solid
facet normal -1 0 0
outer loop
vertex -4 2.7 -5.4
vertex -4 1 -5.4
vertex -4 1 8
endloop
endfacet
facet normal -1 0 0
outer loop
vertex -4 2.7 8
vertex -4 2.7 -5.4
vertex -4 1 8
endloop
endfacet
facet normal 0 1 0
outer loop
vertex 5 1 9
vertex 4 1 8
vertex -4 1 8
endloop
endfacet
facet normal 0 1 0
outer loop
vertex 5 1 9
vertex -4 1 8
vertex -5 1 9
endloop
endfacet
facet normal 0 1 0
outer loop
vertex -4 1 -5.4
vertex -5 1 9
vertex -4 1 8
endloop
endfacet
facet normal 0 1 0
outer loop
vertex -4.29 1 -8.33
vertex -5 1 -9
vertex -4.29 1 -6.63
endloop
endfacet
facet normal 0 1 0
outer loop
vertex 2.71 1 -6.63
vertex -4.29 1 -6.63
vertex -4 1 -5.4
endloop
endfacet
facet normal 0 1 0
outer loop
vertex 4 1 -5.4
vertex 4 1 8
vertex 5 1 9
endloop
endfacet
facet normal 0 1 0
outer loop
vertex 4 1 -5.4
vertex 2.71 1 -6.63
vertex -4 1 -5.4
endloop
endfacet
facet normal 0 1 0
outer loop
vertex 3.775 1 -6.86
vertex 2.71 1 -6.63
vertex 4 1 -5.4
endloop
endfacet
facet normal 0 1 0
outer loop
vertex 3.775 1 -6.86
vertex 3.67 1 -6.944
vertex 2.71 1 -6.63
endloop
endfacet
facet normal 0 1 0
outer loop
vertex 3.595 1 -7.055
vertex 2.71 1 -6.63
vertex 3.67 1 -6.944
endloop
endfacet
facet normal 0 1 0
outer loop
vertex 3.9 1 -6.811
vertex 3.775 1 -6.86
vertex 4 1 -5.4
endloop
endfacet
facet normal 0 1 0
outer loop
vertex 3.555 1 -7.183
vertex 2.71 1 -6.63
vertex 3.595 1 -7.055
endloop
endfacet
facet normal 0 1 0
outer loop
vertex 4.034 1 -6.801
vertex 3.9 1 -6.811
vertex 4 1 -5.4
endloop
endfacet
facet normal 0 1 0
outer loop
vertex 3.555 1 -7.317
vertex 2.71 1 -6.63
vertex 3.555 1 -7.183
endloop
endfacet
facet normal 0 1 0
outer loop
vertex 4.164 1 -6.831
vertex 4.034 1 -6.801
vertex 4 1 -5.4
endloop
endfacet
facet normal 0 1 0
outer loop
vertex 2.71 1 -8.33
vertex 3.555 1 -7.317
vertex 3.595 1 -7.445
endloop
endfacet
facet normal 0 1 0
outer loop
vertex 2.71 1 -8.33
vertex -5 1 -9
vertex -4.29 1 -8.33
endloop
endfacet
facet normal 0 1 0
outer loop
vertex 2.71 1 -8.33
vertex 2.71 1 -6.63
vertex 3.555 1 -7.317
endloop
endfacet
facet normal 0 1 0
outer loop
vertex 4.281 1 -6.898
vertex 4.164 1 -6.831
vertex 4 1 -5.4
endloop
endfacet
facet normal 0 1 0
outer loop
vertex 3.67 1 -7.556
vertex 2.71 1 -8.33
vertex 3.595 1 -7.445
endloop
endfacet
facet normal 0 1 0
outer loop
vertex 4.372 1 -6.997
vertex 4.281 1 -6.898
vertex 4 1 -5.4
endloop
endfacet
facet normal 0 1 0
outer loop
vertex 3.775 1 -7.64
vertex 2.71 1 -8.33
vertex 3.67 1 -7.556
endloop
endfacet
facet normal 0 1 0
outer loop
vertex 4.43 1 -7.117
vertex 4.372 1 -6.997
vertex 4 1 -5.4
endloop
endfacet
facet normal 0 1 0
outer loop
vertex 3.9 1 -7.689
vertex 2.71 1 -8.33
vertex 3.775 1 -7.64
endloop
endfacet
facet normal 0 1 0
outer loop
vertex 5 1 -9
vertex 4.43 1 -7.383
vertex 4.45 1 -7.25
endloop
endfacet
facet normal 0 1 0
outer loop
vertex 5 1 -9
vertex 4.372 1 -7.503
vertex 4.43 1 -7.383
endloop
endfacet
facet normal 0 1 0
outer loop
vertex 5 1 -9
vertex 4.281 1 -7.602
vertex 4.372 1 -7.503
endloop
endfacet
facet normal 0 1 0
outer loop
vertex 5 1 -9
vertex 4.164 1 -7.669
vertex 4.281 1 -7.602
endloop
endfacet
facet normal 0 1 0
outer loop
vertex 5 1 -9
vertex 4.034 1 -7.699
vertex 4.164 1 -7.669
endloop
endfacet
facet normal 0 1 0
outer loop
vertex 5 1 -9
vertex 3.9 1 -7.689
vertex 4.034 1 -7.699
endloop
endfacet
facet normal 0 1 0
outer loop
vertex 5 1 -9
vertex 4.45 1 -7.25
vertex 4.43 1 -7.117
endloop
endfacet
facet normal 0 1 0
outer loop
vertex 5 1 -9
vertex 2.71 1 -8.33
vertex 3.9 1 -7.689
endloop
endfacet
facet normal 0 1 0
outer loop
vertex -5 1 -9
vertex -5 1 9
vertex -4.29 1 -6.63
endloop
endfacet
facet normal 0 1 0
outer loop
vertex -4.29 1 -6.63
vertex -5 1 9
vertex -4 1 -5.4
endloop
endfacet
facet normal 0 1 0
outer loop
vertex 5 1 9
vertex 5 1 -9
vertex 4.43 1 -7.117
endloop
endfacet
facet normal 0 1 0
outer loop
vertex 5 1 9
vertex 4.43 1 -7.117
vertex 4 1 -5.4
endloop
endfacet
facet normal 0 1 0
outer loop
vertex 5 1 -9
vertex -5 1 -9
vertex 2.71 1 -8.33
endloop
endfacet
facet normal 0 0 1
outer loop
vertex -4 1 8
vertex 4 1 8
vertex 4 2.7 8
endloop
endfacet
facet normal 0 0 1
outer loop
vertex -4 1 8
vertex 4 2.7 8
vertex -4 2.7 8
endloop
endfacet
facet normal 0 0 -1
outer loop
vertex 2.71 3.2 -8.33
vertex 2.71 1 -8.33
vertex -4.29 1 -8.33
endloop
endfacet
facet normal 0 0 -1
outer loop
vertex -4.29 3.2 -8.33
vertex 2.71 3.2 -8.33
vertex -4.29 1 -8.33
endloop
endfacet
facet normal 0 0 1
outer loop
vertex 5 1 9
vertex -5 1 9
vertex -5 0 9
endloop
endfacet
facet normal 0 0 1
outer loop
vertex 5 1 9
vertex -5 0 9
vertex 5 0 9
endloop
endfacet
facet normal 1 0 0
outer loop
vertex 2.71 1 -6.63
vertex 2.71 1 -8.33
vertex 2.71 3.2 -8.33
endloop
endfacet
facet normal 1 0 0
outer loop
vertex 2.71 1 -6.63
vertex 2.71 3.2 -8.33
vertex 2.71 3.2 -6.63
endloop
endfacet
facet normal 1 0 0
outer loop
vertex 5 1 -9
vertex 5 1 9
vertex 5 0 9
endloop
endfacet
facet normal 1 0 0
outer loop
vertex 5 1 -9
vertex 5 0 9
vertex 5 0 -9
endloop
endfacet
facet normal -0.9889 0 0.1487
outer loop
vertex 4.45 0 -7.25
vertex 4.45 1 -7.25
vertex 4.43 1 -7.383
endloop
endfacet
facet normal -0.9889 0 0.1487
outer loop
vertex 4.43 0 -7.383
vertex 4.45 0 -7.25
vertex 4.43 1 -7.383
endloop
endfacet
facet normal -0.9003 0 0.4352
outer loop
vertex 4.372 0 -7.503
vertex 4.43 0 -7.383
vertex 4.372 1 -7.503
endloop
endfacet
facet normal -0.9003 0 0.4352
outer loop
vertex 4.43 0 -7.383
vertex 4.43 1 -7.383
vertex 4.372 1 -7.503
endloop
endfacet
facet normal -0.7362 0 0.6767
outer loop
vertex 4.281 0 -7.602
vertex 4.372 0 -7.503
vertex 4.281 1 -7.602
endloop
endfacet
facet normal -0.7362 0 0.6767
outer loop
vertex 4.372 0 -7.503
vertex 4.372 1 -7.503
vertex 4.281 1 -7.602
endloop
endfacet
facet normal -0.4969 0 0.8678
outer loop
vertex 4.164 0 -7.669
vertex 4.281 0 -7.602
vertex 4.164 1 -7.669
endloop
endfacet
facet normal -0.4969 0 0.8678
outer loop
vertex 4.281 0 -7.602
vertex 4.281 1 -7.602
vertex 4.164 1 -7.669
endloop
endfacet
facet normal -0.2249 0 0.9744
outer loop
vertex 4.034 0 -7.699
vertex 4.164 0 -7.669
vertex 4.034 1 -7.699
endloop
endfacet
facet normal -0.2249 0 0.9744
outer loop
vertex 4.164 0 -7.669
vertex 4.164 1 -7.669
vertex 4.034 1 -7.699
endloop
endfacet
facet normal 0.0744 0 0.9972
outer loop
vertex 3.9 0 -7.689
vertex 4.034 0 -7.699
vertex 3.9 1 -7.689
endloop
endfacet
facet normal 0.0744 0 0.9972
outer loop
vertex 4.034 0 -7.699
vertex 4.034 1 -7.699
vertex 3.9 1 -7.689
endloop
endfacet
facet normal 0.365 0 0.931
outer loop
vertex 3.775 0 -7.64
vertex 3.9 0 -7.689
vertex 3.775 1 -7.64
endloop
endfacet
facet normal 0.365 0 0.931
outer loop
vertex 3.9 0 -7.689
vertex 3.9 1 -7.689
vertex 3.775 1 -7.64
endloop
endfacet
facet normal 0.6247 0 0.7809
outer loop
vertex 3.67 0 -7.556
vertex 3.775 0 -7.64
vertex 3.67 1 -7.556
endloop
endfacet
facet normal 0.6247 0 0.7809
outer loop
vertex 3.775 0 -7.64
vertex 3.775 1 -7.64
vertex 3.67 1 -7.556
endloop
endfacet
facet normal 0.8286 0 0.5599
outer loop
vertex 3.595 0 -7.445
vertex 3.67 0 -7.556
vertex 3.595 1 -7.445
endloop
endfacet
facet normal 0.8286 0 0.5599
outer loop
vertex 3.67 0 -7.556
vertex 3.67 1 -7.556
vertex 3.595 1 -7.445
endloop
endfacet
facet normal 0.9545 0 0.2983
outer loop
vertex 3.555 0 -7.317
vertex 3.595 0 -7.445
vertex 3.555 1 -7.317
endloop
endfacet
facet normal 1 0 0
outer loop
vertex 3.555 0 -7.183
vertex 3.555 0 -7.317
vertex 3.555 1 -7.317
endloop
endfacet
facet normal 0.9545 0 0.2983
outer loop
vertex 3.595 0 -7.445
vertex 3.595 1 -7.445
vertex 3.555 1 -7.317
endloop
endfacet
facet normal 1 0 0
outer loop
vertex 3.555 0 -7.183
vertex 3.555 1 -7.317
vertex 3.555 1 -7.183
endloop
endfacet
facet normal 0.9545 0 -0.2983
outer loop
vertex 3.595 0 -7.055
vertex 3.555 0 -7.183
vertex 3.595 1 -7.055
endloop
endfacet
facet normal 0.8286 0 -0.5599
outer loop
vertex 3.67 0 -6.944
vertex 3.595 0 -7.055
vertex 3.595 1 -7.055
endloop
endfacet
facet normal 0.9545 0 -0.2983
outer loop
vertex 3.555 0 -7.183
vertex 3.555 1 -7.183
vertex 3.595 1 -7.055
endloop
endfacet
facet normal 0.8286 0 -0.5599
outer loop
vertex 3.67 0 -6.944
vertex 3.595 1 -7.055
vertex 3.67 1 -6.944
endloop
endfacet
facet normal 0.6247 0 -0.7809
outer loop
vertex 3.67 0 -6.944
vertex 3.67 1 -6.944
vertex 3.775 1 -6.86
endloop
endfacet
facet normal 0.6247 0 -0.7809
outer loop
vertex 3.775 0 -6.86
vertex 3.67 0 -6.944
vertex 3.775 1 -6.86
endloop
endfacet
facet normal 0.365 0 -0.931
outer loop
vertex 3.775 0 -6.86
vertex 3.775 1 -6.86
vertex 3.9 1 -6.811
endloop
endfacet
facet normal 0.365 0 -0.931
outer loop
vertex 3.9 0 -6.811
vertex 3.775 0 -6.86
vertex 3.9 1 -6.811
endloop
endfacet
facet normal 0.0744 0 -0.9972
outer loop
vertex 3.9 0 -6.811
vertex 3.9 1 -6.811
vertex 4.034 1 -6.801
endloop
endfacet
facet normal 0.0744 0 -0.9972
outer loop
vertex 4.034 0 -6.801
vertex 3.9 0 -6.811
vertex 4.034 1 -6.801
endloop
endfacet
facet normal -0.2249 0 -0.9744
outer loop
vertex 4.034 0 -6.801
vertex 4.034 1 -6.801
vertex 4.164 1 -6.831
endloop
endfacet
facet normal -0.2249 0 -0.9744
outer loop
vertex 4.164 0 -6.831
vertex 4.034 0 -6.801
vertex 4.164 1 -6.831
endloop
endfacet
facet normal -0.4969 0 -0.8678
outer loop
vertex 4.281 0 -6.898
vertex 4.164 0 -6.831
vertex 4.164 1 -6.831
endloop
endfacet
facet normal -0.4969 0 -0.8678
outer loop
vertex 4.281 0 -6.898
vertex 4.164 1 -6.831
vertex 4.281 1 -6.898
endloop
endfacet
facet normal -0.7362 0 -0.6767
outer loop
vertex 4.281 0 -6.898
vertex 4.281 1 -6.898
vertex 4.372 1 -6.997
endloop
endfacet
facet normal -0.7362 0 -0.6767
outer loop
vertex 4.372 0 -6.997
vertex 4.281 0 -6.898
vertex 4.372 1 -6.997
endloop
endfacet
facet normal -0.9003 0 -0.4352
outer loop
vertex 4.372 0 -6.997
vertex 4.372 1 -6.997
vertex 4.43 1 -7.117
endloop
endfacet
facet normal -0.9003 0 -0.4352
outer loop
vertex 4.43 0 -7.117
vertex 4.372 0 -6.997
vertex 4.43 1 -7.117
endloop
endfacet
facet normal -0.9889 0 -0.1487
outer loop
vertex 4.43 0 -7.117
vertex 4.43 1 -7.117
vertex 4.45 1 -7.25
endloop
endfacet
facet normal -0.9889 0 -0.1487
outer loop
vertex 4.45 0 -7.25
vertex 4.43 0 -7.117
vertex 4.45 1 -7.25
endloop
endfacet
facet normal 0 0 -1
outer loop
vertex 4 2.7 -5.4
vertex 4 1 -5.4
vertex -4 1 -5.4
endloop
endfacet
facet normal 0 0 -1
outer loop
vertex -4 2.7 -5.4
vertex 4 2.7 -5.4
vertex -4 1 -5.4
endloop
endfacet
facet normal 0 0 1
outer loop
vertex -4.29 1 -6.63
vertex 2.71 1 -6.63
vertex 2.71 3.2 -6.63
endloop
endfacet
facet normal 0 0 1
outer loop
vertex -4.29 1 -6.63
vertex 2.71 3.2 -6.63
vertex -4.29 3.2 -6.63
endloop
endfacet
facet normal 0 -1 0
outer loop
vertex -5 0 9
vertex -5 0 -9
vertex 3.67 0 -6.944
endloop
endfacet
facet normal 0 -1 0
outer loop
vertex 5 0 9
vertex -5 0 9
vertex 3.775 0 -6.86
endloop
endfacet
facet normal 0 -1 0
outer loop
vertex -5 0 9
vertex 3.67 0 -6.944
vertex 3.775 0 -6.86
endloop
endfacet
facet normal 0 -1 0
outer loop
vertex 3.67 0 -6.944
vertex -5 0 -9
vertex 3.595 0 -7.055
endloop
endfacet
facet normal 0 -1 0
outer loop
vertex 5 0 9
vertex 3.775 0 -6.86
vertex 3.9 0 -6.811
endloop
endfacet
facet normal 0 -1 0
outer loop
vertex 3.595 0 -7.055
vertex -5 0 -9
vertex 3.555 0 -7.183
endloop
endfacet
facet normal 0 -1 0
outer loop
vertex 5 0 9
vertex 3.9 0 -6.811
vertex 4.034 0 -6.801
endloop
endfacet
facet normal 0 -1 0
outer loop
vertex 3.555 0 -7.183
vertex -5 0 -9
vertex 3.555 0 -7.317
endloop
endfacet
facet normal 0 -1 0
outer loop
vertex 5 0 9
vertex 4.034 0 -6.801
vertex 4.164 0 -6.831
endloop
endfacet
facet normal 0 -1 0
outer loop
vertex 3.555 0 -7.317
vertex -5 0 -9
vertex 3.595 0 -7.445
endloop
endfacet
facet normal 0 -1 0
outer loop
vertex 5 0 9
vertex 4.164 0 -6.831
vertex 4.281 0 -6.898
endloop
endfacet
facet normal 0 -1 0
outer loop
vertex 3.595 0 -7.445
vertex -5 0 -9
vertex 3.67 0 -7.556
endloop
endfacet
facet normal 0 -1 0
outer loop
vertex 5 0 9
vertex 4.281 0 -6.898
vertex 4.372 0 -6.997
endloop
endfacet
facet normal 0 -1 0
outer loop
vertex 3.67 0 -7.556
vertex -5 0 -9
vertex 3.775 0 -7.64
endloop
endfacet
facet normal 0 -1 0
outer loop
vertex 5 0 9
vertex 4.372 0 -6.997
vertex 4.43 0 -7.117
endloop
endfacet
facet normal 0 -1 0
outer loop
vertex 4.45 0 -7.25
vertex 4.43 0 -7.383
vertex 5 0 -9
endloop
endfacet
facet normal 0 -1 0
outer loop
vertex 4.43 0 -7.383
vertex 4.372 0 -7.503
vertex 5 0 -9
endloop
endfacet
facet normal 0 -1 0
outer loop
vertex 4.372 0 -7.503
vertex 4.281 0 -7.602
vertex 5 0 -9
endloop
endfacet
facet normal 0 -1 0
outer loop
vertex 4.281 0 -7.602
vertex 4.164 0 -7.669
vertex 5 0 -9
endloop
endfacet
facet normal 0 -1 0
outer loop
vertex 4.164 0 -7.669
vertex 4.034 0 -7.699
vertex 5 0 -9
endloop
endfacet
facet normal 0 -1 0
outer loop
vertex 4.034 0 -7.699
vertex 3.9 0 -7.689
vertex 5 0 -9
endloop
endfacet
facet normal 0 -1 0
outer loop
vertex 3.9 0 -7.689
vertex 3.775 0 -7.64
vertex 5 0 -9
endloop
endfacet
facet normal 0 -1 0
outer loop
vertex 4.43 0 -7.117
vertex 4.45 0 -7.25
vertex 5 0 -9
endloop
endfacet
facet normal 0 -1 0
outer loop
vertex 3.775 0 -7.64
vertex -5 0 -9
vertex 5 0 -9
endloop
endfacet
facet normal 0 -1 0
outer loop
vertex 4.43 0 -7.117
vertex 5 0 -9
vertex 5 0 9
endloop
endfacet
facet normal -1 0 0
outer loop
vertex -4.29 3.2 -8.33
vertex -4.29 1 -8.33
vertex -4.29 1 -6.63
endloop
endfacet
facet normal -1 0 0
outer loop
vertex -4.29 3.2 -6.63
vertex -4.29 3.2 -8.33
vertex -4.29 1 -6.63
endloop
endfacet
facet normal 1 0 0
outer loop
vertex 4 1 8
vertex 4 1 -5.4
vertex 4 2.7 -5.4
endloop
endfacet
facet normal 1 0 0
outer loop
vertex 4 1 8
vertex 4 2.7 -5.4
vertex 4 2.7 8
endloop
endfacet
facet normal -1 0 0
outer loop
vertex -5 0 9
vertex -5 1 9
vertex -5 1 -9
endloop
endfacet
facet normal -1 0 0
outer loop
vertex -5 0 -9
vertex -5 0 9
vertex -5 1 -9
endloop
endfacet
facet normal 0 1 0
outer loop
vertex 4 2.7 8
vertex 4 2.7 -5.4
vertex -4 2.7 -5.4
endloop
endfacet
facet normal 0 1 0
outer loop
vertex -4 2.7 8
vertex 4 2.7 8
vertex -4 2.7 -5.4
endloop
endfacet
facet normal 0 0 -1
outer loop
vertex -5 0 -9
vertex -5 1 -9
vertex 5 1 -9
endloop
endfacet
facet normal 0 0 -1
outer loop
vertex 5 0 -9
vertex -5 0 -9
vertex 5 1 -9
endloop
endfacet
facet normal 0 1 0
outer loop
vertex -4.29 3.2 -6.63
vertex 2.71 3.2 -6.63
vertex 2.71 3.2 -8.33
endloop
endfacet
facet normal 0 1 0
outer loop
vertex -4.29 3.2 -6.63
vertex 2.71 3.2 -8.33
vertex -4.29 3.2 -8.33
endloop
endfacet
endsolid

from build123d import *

# Parameters (mm, degrees)
ESQUISSE1_W                         = 10
ESQUISSE1_H                         = 18
BOSS_EXTRU_1_DEPTH                  = 1
ESQUISSE2_W                         = 8
ESQUISSE2_H                         = 13.4
BOSS_EXTRU_2_DEPTH                  = 1.7
ESQUISSE3_W                         = 7
ESQUISSE3_H                         = 1.7
BOSS_EXTRU_3_DEPTH                  = 2.2
DIAM_TRE_DU_PER_AGE_0_9_0_9_1_D     = 0.9
DIAM_TRE_DU_PER_AGE_0_9_0_9_1_DEPTH = 3.2


with BuildPart() as part:
    # Esquisse1 → Boss.-Extru.1 (new body)
    with BuildSketch(Plane(origin=(0, 1, 0), x_dir=(1, 0, 0), z_dir=(0, 1, 0))):
        Rectangle(ESQUISSE1_W, ESQUISSE1_H)
    extrude(amount=-BOSS_EXTRU_1_DEPTH)

    # Esquisse2 → Boss.-Extru.2 (add)
    with BuildSketch(Plane(origin=(0, 1, 0), x_dir=(-1, 0, 0), z_dir=(0, 1, 0))):
        with Locations((0, 1.3)):
            Rectangle(ESQUISSE2_W, ESQUISSE2_H)
    extrude(amount=BOSS_EXTRU_2_DEPTH)

    # Esquisse3 → Boss.-Extru.3 (add)
    with BuildSketch(Plane(origin=(0, 1, 0), x_dir=(-1, 0, 0), z_dir=(0, 1, 0))):
        with Locations((0.79, -7.48)):
            Rectangle(ESQUISSE3_W, ESQUISSE3_H)
    extrude(amount=BOSS_EXTRU_3_DEPTH)

    # Diamètre du perçage Ø0.9 (0.9)1
    with Locations(Plane(origin=(0, 0, 0), x_dir=(-1, 0, 0), z_dir=(0, -1, 0))):
        with Locations((-4, 7.25)):
            Hole(DIAM_TRE_DU_PER_AGE_0_9_0_9_1_D / 2, depth=DIAM_TRE_DU_PER_AGE_0_9_0_9_1_DEPTH)


solid = part.part
